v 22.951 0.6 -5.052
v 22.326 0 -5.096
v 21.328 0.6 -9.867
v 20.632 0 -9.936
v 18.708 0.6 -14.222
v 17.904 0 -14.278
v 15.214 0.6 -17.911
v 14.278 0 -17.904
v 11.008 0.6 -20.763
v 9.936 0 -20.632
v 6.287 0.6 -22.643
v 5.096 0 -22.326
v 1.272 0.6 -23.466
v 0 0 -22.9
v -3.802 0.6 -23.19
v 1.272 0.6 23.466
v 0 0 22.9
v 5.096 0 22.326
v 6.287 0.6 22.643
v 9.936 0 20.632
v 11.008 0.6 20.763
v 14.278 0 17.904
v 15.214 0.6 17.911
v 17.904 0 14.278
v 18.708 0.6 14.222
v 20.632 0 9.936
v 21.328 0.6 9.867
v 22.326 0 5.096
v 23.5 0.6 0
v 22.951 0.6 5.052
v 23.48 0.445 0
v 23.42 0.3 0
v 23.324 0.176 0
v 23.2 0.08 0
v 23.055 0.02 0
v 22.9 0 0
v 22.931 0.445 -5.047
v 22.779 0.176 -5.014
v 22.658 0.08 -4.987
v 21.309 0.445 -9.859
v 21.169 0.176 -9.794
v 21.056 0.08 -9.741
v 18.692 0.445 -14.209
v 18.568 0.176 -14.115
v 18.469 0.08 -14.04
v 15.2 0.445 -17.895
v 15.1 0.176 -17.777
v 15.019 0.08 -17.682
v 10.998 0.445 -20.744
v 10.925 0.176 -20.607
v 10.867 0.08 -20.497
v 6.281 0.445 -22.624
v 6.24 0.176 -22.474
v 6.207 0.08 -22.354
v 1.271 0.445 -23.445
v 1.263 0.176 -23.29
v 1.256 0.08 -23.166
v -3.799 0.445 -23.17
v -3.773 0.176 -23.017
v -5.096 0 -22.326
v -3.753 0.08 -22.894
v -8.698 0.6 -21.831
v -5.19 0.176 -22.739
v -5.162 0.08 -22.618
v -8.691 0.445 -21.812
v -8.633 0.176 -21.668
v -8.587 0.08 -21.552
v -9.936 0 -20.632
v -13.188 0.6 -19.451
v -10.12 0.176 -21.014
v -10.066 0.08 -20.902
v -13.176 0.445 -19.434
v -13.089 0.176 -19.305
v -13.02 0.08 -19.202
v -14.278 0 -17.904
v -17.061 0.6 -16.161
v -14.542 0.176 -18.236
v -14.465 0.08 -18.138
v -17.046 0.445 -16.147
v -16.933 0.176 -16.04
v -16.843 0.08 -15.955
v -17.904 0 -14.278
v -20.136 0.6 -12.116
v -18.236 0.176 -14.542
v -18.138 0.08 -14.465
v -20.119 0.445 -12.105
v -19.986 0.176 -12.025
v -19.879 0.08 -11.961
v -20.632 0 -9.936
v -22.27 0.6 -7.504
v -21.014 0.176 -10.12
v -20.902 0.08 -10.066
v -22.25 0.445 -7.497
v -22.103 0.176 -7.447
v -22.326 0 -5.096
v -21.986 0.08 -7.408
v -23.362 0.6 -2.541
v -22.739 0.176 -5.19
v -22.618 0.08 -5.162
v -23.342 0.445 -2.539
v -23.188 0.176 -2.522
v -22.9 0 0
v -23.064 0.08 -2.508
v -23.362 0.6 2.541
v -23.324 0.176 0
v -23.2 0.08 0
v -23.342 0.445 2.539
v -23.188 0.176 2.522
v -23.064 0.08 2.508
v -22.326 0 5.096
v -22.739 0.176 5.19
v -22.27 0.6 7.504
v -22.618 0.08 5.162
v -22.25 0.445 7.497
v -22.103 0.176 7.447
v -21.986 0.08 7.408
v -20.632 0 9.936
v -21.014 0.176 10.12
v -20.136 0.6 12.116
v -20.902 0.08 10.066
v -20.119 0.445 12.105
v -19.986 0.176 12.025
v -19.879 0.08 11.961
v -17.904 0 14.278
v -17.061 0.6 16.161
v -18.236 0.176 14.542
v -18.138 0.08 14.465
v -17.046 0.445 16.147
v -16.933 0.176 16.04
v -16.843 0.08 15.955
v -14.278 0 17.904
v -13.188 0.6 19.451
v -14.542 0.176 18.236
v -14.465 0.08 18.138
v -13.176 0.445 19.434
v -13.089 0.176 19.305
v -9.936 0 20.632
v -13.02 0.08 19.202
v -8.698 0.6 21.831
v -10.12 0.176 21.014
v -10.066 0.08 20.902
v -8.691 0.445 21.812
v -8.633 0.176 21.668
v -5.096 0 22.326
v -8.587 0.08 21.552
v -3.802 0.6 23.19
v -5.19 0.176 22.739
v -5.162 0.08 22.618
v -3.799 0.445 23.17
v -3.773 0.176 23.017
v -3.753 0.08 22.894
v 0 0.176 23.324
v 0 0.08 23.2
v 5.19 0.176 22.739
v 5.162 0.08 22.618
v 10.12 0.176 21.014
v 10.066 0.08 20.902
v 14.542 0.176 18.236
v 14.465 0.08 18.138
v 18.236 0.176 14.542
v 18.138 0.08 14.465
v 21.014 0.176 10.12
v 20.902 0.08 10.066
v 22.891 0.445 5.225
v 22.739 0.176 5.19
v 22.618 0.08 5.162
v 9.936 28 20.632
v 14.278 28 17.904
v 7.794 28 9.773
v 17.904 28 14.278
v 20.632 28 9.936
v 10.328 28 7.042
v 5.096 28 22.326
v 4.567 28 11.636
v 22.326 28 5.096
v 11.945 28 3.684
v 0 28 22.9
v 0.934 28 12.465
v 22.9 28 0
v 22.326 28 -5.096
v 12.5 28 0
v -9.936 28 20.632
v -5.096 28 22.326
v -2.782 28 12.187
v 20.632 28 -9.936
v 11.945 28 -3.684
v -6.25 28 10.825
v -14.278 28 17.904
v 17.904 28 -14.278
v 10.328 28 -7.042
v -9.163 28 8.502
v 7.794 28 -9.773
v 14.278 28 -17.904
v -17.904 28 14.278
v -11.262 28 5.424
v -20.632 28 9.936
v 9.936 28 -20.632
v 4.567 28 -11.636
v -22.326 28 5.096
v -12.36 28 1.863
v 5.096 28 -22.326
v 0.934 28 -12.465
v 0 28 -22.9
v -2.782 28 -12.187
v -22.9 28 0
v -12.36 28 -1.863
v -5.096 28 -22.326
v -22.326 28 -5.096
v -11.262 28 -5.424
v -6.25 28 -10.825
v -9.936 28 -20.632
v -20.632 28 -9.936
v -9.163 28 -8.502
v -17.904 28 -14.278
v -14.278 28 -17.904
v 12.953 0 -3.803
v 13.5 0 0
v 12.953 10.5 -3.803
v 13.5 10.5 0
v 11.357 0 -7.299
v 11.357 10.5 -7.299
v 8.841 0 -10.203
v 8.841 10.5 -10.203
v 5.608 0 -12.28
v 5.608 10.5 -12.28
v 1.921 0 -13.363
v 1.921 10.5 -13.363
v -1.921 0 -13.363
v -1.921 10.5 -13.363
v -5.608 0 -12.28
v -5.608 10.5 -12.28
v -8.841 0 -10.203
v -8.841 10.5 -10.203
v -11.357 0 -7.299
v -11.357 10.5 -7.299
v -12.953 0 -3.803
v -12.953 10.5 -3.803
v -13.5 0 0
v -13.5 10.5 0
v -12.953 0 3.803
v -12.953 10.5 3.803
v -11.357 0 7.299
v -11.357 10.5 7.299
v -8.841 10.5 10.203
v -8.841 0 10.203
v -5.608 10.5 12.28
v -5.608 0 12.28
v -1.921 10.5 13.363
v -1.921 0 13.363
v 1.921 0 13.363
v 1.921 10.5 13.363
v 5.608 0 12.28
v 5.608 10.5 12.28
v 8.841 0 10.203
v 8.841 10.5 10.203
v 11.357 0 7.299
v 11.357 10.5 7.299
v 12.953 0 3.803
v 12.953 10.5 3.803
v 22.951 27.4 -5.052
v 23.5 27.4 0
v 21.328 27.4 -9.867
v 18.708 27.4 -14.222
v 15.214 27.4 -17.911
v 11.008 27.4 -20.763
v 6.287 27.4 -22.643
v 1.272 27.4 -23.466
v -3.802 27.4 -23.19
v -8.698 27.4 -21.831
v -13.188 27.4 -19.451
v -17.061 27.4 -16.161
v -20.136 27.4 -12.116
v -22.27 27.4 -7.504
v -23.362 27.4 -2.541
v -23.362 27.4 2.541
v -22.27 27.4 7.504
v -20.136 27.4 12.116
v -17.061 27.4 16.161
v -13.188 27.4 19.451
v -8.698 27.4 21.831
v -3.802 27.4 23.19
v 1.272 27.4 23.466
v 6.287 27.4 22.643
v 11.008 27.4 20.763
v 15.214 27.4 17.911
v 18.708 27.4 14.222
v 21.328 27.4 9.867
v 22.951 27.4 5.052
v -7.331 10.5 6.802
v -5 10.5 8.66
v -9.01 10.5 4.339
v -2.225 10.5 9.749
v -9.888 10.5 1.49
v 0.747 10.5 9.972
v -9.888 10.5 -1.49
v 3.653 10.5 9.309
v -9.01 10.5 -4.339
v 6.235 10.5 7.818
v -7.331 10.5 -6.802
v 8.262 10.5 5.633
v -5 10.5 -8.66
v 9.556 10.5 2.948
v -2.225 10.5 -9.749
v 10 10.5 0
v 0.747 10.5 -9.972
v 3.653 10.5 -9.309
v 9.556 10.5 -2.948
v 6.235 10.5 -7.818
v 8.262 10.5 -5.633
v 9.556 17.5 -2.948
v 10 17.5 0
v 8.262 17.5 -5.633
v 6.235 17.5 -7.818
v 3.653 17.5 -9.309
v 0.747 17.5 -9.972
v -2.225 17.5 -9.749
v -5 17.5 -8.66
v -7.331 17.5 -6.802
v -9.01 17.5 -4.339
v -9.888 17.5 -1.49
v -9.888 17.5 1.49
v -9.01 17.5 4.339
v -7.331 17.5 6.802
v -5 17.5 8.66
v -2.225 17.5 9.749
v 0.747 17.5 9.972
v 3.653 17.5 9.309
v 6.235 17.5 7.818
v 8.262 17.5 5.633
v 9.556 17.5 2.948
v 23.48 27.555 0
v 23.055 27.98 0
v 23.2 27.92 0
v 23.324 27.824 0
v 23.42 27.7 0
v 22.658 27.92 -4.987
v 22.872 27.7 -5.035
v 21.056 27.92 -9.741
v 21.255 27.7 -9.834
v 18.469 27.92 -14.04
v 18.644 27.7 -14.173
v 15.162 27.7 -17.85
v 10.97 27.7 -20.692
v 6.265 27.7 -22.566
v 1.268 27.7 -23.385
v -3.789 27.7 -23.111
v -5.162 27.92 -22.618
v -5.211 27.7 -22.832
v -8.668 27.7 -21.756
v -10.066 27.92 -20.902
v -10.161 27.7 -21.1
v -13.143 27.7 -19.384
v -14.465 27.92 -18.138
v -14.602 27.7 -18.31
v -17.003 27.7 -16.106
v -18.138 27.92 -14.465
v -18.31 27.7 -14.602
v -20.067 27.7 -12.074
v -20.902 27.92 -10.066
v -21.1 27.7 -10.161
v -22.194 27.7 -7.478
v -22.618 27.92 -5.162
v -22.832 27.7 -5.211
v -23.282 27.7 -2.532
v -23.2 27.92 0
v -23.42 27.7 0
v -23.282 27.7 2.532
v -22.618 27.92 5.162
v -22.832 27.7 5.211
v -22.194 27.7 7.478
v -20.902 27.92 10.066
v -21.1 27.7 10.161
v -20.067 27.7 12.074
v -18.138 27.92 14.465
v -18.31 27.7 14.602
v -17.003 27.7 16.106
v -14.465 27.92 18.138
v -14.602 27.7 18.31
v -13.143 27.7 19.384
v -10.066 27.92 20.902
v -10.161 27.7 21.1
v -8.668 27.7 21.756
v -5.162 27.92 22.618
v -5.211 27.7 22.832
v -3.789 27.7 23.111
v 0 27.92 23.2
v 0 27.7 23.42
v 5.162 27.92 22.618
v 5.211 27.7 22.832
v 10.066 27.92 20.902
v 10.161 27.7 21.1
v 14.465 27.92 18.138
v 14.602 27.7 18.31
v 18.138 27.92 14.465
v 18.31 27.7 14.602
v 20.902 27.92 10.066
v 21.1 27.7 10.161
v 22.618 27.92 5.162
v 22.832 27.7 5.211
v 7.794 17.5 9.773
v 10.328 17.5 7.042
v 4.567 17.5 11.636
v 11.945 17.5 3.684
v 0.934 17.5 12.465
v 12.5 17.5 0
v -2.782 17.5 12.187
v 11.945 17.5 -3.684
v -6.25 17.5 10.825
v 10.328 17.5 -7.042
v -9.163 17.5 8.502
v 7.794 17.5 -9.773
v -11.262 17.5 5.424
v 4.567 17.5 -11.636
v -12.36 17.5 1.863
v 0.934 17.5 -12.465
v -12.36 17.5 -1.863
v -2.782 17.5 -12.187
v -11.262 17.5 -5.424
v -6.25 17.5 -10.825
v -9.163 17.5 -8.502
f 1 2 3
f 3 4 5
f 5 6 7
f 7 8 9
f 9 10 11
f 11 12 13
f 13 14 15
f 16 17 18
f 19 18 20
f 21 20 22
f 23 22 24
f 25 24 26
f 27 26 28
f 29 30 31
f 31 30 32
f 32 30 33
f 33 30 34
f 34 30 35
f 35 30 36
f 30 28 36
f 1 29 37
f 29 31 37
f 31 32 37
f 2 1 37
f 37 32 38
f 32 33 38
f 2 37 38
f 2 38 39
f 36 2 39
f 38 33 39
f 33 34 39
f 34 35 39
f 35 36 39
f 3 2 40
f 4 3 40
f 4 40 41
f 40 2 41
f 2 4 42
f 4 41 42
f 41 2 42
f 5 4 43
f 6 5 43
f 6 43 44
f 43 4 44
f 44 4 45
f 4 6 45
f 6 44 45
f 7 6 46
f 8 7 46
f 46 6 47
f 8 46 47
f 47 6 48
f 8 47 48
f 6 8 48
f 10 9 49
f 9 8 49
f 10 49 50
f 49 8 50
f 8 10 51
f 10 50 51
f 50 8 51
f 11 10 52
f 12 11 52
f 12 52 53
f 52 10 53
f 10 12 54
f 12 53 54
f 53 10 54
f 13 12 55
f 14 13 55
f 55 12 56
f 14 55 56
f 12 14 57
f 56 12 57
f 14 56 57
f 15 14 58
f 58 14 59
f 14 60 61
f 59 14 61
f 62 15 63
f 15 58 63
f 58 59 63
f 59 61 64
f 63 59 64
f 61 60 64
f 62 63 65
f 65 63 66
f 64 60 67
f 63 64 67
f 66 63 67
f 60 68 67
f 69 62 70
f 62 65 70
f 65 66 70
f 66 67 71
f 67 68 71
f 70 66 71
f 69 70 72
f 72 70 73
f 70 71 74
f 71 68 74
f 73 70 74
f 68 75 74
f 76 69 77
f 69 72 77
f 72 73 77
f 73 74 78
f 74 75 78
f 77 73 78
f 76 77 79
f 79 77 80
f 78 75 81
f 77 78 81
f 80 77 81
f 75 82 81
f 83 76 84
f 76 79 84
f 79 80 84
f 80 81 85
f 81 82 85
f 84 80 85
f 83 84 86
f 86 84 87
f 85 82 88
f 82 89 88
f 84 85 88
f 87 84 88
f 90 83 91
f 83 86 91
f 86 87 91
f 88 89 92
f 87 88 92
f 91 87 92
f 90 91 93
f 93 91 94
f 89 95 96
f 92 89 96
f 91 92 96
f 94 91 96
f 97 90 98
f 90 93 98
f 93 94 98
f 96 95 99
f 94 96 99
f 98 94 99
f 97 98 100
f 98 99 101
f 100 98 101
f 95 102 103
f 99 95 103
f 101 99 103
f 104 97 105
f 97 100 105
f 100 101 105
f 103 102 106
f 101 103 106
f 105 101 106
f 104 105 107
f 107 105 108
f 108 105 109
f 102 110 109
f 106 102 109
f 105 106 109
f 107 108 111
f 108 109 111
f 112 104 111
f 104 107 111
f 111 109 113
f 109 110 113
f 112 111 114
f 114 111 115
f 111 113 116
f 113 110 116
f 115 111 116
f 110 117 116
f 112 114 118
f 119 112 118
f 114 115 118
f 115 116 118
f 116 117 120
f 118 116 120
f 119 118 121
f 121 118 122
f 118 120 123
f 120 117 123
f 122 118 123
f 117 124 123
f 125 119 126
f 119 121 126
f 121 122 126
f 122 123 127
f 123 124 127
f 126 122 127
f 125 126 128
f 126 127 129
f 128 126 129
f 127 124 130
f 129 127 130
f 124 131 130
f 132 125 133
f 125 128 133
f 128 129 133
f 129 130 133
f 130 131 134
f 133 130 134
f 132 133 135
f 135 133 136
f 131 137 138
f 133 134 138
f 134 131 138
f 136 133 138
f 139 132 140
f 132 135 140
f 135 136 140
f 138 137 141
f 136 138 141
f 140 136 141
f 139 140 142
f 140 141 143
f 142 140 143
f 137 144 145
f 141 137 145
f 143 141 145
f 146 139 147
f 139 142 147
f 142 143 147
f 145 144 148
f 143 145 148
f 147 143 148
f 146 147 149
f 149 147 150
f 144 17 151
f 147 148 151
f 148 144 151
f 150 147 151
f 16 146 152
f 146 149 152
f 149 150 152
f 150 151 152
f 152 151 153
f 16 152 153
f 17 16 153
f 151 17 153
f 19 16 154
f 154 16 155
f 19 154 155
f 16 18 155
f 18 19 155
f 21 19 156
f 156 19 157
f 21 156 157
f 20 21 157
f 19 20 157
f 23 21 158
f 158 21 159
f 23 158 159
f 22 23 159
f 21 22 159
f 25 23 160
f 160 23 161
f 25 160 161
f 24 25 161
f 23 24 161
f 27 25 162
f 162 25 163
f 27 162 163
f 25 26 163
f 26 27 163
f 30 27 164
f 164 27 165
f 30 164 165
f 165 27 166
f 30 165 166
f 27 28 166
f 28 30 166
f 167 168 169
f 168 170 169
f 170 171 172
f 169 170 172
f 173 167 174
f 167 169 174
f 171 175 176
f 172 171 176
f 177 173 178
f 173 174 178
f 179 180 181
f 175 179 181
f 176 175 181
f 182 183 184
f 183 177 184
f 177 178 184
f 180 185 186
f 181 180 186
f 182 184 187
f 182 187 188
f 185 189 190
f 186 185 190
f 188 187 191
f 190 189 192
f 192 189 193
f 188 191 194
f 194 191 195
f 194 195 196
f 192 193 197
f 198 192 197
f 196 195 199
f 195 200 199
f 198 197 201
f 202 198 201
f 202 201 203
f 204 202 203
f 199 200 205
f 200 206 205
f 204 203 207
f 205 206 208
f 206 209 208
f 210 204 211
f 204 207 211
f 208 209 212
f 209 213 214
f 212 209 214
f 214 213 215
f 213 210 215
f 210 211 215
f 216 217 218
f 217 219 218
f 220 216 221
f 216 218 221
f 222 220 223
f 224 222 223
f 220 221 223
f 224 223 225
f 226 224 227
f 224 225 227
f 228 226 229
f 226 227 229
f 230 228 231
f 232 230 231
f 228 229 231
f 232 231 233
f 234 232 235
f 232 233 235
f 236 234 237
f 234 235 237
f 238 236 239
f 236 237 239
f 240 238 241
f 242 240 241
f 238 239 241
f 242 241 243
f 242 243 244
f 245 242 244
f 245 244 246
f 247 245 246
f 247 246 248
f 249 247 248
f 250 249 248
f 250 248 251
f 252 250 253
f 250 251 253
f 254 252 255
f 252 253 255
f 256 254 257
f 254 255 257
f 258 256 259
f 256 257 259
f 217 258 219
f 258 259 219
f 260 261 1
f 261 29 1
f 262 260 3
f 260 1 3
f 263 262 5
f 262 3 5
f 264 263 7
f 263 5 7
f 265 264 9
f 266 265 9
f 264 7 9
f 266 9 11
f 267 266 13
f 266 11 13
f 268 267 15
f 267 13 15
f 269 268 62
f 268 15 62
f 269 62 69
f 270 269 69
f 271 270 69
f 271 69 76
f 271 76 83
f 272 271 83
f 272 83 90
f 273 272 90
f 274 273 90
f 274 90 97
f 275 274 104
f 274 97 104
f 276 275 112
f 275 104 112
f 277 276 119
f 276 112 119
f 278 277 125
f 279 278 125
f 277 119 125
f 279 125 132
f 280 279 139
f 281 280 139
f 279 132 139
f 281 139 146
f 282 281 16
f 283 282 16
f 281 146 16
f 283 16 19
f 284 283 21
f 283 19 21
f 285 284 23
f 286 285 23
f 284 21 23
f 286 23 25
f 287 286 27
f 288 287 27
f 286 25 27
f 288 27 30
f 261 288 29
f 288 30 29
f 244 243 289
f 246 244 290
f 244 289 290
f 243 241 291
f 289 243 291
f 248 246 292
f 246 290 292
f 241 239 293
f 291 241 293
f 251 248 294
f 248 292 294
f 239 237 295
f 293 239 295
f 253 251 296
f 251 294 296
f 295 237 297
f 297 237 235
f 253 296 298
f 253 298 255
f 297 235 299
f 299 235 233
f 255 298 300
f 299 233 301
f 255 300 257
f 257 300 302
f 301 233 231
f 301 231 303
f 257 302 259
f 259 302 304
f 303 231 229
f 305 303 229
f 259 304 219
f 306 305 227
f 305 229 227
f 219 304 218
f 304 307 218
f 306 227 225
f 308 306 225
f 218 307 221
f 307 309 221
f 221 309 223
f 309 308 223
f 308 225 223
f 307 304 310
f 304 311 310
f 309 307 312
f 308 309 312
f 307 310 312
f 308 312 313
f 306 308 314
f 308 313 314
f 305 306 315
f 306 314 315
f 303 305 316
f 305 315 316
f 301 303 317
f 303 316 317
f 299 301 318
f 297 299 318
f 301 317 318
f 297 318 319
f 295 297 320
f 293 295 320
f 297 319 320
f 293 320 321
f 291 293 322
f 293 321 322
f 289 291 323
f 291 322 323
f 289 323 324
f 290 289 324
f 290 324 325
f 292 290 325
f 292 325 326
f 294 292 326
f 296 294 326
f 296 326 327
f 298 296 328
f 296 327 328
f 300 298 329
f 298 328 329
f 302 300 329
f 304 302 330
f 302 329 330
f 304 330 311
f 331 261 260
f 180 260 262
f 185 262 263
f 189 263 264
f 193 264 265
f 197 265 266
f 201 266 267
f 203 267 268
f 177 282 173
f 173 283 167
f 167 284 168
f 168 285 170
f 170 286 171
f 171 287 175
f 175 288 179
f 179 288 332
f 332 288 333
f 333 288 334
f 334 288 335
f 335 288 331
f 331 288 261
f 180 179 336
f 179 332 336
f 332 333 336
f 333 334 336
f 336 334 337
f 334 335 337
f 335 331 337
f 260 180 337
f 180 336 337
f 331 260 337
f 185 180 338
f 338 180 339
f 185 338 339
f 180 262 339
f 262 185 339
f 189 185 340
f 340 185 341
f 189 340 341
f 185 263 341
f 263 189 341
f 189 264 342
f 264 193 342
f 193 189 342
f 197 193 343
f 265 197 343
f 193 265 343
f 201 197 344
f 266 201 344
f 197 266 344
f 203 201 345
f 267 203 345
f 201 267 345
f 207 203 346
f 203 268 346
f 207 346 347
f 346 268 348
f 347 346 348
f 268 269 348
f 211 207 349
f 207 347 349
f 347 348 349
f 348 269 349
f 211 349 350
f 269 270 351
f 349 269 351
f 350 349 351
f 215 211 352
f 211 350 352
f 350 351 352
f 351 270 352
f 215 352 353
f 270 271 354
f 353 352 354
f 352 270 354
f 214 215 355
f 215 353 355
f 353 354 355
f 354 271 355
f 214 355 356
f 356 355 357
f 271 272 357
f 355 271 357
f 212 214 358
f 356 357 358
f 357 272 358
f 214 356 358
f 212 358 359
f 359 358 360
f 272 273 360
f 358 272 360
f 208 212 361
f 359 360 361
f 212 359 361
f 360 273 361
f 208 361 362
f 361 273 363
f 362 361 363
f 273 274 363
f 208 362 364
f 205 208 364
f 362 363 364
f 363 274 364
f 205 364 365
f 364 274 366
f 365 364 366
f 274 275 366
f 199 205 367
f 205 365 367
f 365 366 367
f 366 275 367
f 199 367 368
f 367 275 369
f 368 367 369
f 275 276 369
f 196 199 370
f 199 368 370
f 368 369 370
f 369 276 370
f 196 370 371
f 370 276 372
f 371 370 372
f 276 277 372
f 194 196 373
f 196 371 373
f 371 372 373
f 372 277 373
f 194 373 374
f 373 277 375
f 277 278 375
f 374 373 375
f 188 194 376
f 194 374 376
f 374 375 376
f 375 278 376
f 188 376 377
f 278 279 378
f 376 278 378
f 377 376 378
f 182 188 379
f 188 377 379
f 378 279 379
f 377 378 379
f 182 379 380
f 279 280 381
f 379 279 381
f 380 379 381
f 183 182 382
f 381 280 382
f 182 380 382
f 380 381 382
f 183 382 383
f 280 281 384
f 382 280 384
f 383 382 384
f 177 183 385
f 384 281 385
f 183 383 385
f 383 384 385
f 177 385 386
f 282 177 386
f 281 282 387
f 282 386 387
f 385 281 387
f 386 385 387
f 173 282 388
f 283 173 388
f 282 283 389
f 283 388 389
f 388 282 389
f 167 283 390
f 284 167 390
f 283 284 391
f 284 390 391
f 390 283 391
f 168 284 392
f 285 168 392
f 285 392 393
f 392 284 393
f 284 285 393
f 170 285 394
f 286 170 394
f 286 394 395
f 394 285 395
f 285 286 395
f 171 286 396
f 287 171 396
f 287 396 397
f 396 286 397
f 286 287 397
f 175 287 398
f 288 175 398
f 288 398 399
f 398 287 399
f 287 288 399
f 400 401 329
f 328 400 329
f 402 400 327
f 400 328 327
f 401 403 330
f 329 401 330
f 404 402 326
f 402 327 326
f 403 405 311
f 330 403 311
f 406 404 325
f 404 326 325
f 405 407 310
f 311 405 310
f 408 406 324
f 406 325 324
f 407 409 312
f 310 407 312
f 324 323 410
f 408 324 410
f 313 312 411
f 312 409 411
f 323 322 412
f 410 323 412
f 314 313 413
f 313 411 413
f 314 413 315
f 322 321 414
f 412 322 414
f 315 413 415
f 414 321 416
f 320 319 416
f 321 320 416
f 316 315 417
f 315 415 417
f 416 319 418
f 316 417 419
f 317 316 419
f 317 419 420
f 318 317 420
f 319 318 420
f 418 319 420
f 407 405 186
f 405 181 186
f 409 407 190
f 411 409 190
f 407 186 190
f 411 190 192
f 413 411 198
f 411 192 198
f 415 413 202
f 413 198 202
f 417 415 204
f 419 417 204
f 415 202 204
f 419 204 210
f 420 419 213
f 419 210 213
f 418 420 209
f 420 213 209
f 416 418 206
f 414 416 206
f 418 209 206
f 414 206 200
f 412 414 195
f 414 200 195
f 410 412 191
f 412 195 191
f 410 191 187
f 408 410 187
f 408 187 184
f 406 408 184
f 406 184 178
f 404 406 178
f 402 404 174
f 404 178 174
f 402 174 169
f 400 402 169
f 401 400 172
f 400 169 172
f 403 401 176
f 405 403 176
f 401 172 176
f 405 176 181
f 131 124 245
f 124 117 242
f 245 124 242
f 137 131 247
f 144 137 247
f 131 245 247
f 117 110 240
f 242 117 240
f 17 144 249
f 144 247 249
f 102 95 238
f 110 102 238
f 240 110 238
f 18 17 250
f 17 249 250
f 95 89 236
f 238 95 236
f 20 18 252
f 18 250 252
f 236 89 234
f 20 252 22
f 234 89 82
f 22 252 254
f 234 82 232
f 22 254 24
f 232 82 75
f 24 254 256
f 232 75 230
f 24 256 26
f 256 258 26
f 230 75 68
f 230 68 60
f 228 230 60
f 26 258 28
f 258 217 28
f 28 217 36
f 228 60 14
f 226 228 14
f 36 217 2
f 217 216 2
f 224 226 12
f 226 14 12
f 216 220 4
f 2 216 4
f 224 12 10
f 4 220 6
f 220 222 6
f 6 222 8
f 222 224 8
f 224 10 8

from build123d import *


with BuildPart() as part:
    # Szkic1 → Obrót1 (revolve)
    with BuildSketch(Plane.XY, mode=Mode.PRIVATE) as obr_t1_sk:
        with BuildLine():
            Line((-12.5, 28), (-22.9, 28))
            ThreePointArc((-22.9, 28), (-23.324264069, 27.824264069), (-23.5, 27.4))
            Line((-23.5, 27.4), (-23.5, 0.6))
            ThreePointArc((-23.5, 0.6), (-23.324264069, 0.175735931), (-22.9, 0))
            Line((-22.9, 0), (-13.5, 0))
            Line((-13.5, 0), (-13.5, 10.5))
            Line((-13.5, 10.5), (-10, 10.5))
            Line((-10, 10.5), (-10, 17.5))
            Line((-10, 17.5), (-12.5, 17.5))
            Line((-12.5, 17.5), (-12.5, 28))
        make_face()
    revolve(obr_t1_sk.sketch.rotate(Axis((0, 0, 0), (0, 1, 0)), 180), axis=Axis((0, 0, 0), (0, 1, 0)))


solid = part.part
